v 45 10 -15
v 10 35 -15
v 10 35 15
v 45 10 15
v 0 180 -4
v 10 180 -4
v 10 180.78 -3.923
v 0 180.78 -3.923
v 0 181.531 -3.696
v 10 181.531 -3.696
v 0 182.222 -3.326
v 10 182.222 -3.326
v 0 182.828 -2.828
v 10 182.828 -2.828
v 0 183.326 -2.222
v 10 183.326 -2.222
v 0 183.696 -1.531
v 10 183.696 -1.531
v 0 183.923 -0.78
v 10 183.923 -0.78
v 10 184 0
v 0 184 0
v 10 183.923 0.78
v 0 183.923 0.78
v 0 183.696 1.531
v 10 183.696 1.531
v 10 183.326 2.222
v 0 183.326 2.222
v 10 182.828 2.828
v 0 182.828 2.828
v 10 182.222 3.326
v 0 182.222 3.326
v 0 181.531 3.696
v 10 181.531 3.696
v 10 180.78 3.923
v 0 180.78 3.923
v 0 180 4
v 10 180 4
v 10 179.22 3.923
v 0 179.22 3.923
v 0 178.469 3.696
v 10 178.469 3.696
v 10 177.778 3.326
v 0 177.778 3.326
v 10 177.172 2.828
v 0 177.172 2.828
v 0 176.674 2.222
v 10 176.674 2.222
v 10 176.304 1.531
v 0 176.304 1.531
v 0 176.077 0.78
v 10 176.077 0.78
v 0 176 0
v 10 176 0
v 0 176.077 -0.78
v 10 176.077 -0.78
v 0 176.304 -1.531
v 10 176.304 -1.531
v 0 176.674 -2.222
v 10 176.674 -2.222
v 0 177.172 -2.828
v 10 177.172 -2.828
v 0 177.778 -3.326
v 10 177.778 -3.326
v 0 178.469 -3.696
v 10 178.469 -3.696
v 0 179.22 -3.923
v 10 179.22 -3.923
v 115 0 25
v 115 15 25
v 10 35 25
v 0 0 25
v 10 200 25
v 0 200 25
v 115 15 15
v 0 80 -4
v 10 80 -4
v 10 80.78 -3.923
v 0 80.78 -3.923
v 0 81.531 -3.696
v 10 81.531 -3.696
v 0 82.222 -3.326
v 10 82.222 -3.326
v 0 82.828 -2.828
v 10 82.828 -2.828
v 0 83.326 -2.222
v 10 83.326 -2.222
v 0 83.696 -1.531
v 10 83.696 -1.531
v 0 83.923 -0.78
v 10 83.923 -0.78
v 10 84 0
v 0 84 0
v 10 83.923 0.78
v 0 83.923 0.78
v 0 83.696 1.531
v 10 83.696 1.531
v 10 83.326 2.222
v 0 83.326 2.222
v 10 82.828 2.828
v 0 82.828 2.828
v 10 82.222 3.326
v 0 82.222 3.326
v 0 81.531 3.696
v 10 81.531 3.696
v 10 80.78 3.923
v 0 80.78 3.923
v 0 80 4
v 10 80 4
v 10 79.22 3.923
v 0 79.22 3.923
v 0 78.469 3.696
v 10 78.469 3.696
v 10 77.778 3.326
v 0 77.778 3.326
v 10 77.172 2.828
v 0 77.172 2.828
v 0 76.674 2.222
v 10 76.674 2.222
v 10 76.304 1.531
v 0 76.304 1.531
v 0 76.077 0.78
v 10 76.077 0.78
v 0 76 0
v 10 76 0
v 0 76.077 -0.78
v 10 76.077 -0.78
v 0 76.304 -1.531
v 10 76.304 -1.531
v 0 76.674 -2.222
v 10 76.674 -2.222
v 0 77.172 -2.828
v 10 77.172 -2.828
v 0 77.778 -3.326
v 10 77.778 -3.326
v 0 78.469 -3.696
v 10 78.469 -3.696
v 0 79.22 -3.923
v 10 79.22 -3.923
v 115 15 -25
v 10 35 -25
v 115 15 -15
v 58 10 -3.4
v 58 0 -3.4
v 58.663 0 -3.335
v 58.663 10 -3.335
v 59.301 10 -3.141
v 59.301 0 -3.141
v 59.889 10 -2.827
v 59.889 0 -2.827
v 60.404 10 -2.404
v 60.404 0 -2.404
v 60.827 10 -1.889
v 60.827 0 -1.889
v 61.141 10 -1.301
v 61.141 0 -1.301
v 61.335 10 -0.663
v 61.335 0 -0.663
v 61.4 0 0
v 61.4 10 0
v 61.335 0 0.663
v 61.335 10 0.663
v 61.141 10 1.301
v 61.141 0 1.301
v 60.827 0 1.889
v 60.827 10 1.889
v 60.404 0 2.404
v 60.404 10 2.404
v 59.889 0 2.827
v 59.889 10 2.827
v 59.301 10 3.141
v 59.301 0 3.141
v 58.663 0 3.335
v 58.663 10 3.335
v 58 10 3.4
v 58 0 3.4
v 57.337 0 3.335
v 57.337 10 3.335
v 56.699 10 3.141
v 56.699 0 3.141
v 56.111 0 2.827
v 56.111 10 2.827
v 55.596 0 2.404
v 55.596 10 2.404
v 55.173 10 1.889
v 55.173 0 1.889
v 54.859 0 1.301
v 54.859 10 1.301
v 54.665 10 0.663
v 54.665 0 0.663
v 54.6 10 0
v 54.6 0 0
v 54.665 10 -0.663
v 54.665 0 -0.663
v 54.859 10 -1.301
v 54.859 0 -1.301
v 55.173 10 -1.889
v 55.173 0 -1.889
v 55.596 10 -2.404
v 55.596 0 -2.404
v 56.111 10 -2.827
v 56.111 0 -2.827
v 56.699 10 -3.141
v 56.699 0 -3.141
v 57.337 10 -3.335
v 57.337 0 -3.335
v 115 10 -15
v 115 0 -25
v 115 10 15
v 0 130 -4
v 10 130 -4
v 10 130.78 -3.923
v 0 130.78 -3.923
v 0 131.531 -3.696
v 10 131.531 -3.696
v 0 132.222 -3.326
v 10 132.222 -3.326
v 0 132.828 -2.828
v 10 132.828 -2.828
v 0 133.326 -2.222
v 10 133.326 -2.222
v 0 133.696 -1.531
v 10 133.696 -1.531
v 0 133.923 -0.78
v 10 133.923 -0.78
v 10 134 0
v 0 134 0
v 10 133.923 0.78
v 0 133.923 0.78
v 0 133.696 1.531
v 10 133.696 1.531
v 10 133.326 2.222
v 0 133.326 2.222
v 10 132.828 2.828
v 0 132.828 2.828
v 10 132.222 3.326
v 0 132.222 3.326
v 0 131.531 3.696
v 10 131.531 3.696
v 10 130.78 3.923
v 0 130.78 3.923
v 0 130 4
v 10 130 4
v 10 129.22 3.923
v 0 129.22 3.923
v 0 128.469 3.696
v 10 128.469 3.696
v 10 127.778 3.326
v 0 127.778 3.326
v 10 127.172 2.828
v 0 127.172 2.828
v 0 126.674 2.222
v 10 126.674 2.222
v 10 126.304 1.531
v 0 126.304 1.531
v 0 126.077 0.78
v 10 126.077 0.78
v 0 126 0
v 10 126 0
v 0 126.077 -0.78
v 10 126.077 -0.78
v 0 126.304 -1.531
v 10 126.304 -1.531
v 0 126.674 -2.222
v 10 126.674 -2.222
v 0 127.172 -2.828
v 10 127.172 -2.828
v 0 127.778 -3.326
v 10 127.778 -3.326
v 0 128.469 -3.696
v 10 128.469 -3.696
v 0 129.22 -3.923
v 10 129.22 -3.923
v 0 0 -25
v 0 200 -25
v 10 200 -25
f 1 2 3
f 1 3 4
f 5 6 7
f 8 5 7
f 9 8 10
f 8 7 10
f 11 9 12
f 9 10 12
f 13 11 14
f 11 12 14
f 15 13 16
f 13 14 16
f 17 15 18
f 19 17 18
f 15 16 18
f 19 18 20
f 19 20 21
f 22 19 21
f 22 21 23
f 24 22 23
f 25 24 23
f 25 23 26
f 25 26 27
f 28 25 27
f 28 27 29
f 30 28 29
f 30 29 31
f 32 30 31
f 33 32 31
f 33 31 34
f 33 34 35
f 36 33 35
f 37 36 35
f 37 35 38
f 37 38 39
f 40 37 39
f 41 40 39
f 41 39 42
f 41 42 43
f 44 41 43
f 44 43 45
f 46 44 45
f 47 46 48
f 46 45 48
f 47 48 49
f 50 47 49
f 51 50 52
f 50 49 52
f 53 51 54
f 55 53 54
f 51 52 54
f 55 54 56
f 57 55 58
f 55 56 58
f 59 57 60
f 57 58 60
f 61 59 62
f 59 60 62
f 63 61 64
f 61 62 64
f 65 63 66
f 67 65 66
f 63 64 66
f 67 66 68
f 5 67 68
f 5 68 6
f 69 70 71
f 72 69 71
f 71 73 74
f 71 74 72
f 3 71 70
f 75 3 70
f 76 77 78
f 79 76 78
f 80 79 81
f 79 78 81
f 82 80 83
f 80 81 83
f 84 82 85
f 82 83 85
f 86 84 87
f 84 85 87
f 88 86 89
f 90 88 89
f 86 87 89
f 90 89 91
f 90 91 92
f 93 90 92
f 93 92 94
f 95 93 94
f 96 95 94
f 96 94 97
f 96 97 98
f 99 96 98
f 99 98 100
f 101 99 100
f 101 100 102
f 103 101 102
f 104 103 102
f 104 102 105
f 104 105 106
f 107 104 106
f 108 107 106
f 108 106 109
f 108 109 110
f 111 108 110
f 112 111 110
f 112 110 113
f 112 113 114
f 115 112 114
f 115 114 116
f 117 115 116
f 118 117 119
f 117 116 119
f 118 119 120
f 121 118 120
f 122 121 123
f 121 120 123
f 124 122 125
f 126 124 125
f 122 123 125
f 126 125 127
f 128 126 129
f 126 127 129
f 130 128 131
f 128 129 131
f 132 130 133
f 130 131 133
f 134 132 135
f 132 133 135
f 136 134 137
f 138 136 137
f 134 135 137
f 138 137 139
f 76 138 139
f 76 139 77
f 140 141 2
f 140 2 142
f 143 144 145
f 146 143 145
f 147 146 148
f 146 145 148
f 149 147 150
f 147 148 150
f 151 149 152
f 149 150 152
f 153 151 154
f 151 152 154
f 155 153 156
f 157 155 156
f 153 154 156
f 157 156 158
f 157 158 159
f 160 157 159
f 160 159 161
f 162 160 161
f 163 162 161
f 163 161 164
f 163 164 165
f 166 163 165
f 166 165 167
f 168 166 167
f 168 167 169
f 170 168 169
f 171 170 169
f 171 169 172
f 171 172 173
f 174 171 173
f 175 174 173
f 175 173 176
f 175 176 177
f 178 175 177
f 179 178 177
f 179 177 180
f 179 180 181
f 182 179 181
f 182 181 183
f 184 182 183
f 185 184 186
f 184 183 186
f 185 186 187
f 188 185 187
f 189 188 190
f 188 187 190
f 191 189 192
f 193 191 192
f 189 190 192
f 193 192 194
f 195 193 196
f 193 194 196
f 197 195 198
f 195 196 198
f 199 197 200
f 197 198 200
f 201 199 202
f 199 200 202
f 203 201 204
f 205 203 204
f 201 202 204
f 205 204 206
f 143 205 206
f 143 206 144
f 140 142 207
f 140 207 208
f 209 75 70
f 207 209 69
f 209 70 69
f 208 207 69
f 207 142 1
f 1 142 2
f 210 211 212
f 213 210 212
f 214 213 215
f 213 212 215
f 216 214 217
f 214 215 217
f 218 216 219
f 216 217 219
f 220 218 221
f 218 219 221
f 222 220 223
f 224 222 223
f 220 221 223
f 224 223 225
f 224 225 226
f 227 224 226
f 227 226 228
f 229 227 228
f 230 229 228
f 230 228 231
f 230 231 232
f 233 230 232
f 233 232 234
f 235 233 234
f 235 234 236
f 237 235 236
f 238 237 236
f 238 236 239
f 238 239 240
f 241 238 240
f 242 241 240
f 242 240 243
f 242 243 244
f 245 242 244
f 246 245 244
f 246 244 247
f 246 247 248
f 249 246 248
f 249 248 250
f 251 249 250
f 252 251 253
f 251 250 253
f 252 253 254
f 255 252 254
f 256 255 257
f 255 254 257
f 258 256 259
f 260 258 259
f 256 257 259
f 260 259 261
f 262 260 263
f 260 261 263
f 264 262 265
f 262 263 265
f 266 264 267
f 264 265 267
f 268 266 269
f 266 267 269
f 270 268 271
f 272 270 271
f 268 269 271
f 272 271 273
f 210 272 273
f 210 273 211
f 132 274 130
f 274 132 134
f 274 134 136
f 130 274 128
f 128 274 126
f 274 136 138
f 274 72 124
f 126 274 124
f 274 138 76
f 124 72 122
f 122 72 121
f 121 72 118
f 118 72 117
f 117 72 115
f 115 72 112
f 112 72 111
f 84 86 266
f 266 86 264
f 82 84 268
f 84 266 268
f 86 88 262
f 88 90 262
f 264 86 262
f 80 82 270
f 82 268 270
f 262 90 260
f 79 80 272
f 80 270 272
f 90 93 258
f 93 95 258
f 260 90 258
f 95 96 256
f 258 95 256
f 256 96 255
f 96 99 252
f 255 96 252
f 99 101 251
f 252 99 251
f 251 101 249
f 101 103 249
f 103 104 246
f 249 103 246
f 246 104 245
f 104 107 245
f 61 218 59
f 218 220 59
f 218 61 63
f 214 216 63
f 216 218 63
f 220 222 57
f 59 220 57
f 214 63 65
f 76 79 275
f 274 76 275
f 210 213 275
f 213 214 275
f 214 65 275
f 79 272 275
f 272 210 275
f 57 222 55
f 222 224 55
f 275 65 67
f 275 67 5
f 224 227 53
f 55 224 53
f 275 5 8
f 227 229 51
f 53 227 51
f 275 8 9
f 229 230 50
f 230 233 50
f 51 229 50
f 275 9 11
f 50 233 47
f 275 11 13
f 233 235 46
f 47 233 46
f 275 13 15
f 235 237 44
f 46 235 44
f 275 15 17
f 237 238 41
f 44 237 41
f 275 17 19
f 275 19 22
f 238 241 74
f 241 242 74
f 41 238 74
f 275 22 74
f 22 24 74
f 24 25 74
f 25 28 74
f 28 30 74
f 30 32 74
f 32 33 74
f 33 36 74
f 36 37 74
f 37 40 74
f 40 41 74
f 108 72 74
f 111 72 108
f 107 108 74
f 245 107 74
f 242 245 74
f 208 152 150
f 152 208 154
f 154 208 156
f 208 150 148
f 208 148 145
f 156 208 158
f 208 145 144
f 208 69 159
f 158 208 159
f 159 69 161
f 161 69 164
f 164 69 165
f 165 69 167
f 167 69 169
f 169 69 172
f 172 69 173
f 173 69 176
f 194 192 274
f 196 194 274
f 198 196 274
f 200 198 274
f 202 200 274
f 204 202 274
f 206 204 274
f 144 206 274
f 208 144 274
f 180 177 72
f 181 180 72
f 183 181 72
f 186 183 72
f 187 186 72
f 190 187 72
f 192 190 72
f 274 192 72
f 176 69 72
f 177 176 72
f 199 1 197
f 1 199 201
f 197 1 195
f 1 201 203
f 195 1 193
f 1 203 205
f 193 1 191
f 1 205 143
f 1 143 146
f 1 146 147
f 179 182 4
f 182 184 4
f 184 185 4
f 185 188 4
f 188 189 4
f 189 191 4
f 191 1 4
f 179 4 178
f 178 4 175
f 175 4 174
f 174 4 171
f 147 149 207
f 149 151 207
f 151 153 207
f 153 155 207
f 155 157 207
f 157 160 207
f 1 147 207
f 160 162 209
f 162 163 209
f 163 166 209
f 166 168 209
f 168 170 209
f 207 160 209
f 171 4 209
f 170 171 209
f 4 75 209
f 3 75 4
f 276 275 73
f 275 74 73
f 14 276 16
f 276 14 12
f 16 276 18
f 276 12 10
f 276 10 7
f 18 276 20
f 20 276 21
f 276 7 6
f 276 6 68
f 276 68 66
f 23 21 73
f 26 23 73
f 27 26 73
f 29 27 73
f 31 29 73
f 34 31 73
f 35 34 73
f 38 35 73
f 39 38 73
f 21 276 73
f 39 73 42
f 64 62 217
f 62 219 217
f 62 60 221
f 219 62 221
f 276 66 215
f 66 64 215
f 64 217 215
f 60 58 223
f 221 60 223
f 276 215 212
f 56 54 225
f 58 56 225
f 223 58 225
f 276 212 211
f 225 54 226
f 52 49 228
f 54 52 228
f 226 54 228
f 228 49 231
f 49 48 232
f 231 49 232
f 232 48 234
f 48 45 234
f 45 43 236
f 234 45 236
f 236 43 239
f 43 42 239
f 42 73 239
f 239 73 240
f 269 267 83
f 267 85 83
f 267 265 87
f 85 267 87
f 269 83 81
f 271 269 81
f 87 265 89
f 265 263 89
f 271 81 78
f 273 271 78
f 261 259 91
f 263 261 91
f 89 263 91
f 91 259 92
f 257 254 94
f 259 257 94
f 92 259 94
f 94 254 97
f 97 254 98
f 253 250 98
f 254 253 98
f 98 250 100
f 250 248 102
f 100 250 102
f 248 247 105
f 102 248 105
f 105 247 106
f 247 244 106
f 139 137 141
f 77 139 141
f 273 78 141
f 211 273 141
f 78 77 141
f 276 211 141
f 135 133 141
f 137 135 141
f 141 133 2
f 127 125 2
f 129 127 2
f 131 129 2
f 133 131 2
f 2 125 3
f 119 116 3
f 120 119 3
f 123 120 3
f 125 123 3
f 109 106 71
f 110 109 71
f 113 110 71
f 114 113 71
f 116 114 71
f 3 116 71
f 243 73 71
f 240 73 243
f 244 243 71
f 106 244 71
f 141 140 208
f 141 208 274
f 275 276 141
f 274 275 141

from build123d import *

# Parameters (mm, degrees)
BOSS_EXTRUDE1_DEPTH = 25
SKETCH3_R           = 4
CUT_EXTRUDE2_DEPTH  = 228.266363547
CUT_EXTRUDE3_REACH  = 234.056
SKETCH4_R           = 3.4
BOSS_EXTRUDE2_DEPTH = 50
BOSS_EXTRUDE3_DEPTH = 10


with BuildPart() as part:
    # Sketch1 → Boss-Extrude1 (new, symmetric)
    with BuildSketch(Plane.XY):
        Polygon((0, 0), (0, 200), (10, 200), (10, 10), (115, 10), (115, 0), align=None)
    extrude(amount=BOSS_EXTRUDE1_DEPTH, both=True)

    # Sketch3 → Cut-Extrude2 (cut, through all)
    with BuildSketch(Plane(origin=(10, 0, 0), x_dir=(0, 0, -1), z_dir=(1, 0, 0))):
        with Locations((0, 180)):
            Circle(SKETCH3_R)
        with Locations((0, 130)):
            Circle(SKETCH3_R)
        with Locations((0, 80)):
            Circle(SKETCH3_R)
    extrude(amount=-CUT_EXTRUDE2_DEPTH, mode=Mode.SUBTRACT)

    # Sketch4 → Cut-Extrude3 (cut, up to next)
    with BuildSketch(Plane.XZ, mode=Mode.PRIVATE) as cut_extrude3_sk1:
        with Locations(Location((58, 0, 0), (0, 0, 270))):
            Circle(SKETCH4_R)
    cut_extrude3_tool1 = extrude(cut_extrude3_sk1.sketch, amount=-CUT_EXTRUDE3_REACH, mode=Mode.PRIVATE) & part.part
    add(cut_extrude3_tool1.solids().sort_by_distance((58, 0, 0))[0], mode=Mode.SUBTRACT)

    # Sketch5 → Boss-Extrude2 (add)
    with BuildSketch(Plane(origin=(0, 0, -25), x_dir=(-1, 0, 0), z_dir=(0, 0, -1))):
        Polygon((-45, 10), (-10, 10), (-10, 35), align=None)
    extrude(amount=-BOSS_EXTRUDE2_DEPTH)

    # Sketch6 → Boss-Extrude3 (add)
    with BuildSketch(Plane(origin=(0, 0, -25), x_dir=(-1, 0, 0), z_dir=(0, 0, -1))):
        Polygon((-115, 10), (-10, 10), (-10, 35), (-115, 15), align=None)
    boss_extrude3 = extrude(amount=-BOSS_EXTRUDE3_DEPTH)

    # Mirror2: Boss-Extrude3 across plane
    add(boss_extrude3.mirror(Plane(origin=(0, 0, 0), x_dir=(1, 0, 0), z_dir=(0, 0, -1))))


solid = part.part
